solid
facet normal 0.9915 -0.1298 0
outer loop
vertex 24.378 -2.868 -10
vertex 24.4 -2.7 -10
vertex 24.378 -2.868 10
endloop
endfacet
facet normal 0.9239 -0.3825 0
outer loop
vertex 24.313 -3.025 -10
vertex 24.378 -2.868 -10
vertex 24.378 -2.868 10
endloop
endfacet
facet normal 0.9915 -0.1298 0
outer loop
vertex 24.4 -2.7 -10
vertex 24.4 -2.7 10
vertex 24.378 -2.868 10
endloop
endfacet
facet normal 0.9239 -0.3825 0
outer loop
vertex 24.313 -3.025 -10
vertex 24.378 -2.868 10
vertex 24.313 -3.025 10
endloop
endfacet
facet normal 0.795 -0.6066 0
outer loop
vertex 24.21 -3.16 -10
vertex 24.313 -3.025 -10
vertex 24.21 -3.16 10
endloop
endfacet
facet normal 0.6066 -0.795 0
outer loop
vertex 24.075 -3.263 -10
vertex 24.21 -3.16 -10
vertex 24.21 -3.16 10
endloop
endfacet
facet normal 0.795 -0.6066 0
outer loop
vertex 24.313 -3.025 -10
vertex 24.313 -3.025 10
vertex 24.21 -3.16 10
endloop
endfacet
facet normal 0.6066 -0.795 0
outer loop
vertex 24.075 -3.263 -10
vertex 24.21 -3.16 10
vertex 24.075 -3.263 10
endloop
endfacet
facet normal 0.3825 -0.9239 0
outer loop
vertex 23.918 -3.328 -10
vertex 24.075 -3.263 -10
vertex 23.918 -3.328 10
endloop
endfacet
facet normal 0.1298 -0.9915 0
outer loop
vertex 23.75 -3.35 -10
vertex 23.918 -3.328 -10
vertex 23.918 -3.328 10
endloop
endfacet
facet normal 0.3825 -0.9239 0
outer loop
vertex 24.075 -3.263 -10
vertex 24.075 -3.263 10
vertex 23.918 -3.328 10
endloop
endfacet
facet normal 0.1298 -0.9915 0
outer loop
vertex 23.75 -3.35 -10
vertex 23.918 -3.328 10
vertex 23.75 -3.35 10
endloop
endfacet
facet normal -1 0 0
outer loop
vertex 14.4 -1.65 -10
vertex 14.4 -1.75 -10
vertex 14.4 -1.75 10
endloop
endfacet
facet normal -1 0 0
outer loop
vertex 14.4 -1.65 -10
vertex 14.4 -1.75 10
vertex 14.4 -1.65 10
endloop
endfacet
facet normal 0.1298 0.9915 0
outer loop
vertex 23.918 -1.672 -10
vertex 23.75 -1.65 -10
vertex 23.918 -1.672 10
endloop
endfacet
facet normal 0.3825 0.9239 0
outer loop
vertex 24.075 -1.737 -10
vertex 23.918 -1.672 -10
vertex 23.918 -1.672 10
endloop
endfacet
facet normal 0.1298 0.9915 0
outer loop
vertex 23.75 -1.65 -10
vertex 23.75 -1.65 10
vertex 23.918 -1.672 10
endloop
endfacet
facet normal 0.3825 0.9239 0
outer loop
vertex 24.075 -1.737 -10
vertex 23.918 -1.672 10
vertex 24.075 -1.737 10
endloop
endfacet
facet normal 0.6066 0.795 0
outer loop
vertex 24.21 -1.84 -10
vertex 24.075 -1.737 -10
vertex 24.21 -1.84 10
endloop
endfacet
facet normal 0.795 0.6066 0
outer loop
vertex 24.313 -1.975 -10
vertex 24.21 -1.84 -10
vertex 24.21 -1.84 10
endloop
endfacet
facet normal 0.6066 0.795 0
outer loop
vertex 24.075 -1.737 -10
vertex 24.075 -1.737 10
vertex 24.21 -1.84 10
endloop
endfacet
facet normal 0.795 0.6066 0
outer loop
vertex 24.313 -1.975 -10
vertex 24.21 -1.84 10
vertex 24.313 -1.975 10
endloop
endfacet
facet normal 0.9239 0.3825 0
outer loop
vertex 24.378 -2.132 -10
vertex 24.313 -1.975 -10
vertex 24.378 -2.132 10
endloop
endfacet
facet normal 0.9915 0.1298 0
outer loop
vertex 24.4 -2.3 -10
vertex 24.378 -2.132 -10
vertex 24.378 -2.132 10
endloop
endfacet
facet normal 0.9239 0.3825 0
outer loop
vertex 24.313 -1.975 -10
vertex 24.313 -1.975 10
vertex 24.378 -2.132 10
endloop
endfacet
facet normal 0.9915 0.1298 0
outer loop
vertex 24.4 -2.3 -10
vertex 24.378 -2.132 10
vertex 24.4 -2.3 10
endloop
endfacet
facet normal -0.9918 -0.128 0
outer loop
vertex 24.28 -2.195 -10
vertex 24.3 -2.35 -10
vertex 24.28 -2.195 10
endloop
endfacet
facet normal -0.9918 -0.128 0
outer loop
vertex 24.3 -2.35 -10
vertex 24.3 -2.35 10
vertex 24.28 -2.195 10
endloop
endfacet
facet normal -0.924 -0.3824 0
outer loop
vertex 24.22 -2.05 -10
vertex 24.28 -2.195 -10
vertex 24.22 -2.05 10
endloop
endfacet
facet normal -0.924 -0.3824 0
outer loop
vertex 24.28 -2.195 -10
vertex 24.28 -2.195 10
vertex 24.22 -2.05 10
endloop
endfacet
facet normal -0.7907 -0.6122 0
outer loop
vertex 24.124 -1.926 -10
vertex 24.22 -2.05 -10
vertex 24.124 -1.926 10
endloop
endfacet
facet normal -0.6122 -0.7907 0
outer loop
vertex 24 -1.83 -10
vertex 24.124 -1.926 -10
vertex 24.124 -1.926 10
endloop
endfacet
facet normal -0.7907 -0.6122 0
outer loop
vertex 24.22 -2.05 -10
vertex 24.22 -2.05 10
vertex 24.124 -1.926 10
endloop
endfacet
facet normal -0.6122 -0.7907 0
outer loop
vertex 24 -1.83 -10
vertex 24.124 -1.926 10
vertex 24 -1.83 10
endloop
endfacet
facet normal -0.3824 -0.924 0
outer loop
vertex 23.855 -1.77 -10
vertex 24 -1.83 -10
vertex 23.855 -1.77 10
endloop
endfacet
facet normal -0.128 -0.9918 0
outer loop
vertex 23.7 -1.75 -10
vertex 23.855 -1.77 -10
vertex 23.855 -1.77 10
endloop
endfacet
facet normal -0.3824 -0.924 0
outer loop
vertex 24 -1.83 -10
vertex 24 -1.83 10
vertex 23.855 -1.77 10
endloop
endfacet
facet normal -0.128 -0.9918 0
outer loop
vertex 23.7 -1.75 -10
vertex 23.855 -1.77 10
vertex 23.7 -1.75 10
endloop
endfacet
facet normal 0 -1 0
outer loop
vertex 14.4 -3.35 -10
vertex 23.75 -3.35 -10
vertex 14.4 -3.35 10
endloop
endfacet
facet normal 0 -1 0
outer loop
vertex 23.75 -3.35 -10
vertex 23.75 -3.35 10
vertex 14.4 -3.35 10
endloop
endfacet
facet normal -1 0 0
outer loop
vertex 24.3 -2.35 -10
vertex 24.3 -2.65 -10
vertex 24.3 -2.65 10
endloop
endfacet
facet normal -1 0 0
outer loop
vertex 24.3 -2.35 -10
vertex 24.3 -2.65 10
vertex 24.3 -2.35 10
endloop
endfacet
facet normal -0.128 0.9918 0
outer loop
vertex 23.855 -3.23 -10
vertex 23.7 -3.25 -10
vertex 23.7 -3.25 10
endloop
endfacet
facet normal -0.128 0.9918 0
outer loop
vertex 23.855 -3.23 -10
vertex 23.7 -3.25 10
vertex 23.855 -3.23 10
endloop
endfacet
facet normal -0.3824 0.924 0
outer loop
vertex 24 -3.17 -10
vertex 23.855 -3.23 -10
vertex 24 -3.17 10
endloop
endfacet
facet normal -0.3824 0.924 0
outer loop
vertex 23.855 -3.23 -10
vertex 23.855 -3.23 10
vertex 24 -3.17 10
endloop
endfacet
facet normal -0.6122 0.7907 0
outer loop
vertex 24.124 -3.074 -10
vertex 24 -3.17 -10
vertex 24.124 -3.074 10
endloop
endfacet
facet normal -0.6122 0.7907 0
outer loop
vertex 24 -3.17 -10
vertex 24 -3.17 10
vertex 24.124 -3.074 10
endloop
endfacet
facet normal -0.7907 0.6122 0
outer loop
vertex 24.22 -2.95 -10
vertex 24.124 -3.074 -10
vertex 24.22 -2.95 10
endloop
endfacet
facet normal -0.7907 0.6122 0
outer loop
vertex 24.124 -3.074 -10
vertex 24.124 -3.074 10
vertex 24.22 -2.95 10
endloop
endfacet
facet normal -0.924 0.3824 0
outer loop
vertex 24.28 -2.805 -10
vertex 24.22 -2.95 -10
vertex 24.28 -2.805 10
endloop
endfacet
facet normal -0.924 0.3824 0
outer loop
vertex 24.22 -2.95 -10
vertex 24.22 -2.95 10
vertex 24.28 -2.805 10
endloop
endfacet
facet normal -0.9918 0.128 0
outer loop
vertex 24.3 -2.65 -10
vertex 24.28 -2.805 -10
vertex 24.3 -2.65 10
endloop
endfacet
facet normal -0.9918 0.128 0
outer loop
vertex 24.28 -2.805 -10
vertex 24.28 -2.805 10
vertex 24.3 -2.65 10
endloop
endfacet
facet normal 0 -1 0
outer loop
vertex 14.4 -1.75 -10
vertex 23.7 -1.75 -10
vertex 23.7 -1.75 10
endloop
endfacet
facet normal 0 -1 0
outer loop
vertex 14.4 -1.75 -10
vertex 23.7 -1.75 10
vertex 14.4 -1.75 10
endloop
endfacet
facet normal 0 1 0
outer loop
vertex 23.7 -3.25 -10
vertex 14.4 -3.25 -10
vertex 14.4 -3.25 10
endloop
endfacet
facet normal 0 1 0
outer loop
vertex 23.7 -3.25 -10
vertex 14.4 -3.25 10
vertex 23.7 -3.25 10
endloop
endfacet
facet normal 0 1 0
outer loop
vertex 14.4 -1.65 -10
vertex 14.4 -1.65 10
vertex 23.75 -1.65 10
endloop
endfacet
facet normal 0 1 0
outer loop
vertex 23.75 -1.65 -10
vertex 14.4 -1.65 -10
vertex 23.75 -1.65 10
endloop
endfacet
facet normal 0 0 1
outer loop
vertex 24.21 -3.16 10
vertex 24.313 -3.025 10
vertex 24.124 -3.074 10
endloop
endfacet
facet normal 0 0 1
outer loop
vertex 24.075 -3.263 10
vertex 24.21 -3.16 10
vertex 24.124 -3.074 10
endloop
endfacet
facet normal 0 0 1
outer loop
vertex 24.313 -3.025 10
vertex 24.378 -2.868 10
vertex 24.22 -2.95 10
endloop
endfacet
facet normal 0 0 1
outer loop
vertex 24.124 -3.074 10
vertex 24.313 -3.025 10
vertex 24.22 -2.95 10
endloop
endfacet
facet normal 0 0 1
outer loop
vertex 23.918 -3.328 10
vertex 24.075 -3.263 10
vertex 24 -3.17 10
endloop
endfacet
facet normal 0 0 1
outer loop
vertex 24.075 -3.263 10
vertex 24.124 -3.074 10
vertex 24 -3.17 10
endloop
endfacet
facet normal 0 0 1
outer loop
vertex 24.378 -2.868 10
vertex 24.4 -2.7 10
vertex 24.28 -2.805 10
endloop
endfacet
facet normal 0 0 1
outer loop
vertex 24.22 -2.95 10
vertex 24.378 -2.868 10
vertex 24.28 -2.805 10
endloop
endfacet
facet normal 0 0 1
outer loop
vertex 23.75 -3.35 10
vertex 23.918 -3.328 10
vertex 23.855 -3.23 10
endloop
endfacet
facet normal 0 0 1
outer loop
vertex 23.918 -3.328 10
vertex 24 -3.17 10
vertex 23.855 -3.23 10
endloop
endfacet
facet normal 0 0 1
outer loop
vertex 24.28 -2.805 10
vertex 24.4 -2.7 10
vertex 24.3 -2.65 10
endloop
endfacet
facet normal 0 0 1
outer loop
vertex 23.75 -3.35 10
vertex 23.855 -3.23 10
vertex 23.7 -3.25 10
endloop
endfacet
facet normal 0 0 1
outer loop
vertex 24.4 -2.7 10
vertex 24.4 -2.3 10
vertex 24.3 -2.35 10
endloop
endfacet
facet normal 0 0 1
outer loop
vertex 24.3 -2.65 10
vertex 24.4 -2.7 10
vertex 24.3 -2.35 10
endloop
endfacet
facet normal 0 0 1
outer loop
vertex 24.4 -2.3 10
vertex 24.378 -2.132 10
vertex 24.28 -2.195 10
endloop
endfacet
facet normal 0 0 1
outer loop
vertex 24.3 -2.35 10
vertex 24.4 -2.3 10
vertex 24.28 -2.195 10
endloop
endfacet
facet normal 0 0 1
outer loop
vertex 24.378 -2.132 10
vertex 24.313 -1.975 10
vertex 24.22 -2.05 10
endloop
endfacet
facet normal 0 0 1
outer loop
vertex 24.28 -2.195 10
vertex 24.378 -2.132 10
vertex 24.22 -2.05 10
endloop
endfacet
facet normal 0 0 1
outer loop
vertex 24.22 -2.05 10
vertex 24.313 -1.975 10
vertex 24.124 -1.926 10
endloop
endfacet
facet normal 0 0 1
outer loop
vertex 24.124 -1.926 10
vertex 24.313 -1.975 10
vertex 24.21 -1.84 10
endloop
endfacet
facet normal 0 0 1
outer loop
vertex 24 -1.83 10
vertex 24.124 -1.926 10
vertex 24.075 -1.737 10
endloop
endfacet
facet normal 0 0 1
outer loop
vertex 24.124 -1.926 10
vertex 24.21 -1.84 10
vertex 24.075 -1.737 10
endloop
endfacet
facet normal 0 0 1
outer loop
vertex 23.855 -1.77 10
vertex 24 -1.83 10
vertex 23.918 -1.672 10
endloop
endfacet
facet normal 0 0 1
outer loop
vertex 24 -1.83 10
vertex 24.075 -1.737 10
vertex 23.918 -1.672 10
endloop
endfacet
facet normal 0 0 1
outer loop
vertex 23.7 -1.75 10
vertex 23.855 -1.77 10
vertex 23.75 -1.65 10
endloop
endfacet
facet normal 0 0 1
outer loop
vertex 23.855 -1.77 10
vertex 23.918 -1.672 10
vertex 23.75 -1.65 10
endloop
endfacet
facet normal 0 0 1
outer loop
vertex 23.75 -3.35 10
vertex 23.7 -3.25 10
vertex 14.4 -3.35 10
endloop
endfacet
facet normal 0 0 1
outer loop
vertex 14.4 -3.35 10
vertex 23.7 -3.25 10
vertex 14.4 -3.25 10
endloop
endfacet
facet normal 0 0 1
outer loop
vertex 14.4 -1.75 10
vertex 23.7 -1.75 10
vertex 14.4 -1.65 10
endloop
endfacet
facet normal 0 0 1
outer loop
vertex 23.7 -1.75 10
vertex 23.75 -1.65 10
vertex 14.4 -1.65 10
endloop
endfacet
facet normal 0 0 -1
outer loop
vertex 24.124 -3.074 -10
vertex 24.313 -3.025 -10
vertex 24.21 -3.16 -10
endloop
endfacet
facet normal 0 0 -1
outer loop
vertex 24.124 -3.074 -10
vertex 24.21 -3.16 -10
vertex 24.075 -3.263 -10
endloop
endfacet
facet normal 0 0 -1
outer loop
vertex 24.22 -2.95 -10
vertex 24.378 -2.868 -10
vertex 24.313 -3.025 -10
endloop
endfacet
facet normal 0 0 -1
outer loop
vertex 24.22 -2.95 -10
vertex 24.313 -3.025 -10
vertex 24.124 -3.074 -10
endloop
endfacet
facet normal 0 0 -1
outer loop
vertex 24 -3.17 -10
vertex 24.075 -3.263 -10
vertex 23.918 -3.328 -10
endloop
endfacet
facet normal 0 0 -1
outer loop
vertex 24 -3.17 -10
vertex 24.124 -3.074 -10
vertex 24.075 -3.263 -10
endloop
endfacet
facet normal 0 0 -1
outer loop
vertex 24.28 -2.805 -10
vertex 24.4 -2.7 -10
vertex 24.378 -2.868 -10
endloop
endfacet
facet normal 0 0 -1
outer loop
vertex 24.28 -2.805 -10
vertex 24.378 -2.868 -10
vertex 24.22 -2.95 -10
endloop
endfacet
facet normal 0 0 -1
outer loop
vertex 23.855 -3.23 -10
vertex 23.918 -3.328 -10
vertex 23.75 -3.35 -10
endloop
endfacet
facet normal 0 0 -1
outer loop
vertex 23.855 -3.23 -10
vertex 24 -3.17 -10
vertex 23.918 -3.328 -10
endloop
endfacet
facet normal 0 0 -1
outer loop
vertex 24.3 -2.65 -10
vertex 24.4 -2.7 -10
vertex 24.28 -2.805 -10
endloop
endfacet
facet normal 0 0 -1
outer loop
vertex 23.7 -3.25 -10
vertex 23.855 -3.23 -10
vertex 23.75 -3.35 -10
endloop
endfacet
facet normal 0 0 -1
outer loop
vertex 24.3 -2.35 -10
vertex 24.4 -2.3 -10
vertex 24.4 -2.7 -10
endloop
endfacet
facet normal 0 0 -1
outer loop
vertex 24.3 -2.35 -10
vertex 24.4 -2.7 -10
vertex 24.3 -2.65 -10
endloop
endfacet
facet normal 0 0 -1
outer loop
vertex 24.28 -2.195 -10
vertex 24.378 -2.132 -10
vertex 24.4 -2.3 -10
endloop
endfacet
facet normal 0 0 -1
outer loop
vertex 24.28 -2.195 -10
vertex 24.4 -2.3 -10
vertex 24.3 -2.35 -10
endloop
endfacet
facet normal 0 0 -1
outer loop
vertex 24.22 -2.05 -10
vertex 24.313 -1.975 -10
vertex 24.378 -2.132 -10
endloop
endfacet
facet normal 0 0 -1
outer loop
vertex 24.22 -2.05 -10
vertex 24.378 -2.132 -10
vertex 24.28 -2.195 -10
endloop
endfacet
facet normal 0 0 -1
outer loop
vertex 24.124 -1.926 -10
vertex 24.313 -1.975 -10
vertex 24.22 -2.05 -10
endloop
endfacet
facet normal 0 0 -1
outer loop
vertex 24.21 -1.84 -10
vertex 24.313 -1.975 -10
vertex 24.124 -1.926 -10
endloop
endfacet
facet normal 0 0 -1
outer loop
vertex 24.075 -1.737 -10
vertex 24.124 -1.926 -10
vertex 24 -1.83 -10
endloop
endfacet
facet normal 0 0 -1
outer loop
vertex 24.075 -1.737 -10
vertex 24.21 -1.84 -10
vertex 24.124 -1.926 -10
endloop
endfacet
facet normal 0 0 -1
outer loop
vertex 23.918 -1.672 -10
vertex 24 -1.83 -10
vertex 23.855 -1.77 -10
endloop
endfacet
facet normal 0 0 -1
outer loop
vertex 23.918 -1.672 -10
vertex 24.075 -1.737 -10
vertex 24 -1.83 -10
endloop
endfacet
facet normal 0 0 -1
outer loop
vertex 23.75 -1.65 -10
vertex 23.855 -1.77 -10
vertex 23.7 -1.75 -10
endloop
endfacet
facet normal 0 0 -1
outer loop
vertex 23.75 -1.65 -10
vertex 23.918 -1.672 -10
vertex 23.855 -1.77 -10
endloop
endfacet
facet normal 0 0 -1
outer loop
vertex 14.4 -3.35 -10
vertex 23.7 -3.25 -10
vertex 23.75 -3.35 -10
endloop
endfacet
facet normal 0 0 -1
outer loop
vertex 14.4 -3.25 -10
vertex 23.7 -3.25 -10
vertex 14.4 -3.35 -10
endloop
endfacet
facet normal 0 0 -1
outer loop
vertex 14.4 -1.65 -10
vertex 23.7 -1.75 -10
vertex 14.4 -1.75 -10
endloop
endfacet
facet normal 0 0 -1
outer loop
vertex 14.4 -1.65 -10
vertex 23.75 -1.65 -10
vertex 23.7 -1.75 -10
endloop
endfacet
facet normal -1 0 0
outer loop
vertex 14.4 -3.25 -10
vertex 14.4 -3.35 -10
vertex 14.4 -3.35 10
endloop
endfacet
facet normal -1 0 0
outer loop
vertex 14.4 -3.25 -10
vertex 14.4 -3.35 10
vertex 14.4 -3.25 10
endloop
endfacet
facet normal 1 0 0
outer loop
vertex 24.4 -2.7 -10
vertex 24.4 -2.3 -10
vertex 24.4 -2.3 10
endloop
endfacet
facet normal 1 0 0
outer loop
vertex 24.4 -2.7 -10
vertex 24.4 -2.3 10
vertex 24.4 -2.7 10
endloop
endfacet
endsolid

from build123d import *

# Parameters (mm, degrees)
EXTRUDE_1_DEPTH = 10


with BuildPart() as part:
    # Эскиз1 → Бобышка-Вытянуть1 (new, symmetric)
    with BuildSketch(Plane.XY):
        with BuildLine():
            Line((14.4, -1.65), (23.75, -1.65))
            ThreePointArc((23.75, -1.65), (24.209619408, -1.840380592), (24.4, -2.3))
            Line((24.4, -2.3), (24.4, -2.7))
            ThreePointArc((24.4, -2.7), (24.209619408, -3.159619408), (23.75, -3.35))
            Line((23.75, -3.35), (14.4, -3.35))
            Line((14.4, -3.35), (14.4, -3.25))
            Line((14.4, -3.25), (23.7, -3.25))
            ThreePointArc((23.7, -3.25), (24.124264069, -3.074264069), (24.3, -2.65))
            Line((24.3, -2.65), (24.3, -2.35))
            ThreePointArc((24.3, -2.35), (24.124264069, -1.925735931), (23.7, -1.75))
            Line((23.7, -1.75), (14.4, -1.75))
            Line((14.4, -1.75), (14.4, -1.65))
        make_face()
    extrude(amount=EXTRUDE_1_DEPTH, both=True)


solid = part.part
